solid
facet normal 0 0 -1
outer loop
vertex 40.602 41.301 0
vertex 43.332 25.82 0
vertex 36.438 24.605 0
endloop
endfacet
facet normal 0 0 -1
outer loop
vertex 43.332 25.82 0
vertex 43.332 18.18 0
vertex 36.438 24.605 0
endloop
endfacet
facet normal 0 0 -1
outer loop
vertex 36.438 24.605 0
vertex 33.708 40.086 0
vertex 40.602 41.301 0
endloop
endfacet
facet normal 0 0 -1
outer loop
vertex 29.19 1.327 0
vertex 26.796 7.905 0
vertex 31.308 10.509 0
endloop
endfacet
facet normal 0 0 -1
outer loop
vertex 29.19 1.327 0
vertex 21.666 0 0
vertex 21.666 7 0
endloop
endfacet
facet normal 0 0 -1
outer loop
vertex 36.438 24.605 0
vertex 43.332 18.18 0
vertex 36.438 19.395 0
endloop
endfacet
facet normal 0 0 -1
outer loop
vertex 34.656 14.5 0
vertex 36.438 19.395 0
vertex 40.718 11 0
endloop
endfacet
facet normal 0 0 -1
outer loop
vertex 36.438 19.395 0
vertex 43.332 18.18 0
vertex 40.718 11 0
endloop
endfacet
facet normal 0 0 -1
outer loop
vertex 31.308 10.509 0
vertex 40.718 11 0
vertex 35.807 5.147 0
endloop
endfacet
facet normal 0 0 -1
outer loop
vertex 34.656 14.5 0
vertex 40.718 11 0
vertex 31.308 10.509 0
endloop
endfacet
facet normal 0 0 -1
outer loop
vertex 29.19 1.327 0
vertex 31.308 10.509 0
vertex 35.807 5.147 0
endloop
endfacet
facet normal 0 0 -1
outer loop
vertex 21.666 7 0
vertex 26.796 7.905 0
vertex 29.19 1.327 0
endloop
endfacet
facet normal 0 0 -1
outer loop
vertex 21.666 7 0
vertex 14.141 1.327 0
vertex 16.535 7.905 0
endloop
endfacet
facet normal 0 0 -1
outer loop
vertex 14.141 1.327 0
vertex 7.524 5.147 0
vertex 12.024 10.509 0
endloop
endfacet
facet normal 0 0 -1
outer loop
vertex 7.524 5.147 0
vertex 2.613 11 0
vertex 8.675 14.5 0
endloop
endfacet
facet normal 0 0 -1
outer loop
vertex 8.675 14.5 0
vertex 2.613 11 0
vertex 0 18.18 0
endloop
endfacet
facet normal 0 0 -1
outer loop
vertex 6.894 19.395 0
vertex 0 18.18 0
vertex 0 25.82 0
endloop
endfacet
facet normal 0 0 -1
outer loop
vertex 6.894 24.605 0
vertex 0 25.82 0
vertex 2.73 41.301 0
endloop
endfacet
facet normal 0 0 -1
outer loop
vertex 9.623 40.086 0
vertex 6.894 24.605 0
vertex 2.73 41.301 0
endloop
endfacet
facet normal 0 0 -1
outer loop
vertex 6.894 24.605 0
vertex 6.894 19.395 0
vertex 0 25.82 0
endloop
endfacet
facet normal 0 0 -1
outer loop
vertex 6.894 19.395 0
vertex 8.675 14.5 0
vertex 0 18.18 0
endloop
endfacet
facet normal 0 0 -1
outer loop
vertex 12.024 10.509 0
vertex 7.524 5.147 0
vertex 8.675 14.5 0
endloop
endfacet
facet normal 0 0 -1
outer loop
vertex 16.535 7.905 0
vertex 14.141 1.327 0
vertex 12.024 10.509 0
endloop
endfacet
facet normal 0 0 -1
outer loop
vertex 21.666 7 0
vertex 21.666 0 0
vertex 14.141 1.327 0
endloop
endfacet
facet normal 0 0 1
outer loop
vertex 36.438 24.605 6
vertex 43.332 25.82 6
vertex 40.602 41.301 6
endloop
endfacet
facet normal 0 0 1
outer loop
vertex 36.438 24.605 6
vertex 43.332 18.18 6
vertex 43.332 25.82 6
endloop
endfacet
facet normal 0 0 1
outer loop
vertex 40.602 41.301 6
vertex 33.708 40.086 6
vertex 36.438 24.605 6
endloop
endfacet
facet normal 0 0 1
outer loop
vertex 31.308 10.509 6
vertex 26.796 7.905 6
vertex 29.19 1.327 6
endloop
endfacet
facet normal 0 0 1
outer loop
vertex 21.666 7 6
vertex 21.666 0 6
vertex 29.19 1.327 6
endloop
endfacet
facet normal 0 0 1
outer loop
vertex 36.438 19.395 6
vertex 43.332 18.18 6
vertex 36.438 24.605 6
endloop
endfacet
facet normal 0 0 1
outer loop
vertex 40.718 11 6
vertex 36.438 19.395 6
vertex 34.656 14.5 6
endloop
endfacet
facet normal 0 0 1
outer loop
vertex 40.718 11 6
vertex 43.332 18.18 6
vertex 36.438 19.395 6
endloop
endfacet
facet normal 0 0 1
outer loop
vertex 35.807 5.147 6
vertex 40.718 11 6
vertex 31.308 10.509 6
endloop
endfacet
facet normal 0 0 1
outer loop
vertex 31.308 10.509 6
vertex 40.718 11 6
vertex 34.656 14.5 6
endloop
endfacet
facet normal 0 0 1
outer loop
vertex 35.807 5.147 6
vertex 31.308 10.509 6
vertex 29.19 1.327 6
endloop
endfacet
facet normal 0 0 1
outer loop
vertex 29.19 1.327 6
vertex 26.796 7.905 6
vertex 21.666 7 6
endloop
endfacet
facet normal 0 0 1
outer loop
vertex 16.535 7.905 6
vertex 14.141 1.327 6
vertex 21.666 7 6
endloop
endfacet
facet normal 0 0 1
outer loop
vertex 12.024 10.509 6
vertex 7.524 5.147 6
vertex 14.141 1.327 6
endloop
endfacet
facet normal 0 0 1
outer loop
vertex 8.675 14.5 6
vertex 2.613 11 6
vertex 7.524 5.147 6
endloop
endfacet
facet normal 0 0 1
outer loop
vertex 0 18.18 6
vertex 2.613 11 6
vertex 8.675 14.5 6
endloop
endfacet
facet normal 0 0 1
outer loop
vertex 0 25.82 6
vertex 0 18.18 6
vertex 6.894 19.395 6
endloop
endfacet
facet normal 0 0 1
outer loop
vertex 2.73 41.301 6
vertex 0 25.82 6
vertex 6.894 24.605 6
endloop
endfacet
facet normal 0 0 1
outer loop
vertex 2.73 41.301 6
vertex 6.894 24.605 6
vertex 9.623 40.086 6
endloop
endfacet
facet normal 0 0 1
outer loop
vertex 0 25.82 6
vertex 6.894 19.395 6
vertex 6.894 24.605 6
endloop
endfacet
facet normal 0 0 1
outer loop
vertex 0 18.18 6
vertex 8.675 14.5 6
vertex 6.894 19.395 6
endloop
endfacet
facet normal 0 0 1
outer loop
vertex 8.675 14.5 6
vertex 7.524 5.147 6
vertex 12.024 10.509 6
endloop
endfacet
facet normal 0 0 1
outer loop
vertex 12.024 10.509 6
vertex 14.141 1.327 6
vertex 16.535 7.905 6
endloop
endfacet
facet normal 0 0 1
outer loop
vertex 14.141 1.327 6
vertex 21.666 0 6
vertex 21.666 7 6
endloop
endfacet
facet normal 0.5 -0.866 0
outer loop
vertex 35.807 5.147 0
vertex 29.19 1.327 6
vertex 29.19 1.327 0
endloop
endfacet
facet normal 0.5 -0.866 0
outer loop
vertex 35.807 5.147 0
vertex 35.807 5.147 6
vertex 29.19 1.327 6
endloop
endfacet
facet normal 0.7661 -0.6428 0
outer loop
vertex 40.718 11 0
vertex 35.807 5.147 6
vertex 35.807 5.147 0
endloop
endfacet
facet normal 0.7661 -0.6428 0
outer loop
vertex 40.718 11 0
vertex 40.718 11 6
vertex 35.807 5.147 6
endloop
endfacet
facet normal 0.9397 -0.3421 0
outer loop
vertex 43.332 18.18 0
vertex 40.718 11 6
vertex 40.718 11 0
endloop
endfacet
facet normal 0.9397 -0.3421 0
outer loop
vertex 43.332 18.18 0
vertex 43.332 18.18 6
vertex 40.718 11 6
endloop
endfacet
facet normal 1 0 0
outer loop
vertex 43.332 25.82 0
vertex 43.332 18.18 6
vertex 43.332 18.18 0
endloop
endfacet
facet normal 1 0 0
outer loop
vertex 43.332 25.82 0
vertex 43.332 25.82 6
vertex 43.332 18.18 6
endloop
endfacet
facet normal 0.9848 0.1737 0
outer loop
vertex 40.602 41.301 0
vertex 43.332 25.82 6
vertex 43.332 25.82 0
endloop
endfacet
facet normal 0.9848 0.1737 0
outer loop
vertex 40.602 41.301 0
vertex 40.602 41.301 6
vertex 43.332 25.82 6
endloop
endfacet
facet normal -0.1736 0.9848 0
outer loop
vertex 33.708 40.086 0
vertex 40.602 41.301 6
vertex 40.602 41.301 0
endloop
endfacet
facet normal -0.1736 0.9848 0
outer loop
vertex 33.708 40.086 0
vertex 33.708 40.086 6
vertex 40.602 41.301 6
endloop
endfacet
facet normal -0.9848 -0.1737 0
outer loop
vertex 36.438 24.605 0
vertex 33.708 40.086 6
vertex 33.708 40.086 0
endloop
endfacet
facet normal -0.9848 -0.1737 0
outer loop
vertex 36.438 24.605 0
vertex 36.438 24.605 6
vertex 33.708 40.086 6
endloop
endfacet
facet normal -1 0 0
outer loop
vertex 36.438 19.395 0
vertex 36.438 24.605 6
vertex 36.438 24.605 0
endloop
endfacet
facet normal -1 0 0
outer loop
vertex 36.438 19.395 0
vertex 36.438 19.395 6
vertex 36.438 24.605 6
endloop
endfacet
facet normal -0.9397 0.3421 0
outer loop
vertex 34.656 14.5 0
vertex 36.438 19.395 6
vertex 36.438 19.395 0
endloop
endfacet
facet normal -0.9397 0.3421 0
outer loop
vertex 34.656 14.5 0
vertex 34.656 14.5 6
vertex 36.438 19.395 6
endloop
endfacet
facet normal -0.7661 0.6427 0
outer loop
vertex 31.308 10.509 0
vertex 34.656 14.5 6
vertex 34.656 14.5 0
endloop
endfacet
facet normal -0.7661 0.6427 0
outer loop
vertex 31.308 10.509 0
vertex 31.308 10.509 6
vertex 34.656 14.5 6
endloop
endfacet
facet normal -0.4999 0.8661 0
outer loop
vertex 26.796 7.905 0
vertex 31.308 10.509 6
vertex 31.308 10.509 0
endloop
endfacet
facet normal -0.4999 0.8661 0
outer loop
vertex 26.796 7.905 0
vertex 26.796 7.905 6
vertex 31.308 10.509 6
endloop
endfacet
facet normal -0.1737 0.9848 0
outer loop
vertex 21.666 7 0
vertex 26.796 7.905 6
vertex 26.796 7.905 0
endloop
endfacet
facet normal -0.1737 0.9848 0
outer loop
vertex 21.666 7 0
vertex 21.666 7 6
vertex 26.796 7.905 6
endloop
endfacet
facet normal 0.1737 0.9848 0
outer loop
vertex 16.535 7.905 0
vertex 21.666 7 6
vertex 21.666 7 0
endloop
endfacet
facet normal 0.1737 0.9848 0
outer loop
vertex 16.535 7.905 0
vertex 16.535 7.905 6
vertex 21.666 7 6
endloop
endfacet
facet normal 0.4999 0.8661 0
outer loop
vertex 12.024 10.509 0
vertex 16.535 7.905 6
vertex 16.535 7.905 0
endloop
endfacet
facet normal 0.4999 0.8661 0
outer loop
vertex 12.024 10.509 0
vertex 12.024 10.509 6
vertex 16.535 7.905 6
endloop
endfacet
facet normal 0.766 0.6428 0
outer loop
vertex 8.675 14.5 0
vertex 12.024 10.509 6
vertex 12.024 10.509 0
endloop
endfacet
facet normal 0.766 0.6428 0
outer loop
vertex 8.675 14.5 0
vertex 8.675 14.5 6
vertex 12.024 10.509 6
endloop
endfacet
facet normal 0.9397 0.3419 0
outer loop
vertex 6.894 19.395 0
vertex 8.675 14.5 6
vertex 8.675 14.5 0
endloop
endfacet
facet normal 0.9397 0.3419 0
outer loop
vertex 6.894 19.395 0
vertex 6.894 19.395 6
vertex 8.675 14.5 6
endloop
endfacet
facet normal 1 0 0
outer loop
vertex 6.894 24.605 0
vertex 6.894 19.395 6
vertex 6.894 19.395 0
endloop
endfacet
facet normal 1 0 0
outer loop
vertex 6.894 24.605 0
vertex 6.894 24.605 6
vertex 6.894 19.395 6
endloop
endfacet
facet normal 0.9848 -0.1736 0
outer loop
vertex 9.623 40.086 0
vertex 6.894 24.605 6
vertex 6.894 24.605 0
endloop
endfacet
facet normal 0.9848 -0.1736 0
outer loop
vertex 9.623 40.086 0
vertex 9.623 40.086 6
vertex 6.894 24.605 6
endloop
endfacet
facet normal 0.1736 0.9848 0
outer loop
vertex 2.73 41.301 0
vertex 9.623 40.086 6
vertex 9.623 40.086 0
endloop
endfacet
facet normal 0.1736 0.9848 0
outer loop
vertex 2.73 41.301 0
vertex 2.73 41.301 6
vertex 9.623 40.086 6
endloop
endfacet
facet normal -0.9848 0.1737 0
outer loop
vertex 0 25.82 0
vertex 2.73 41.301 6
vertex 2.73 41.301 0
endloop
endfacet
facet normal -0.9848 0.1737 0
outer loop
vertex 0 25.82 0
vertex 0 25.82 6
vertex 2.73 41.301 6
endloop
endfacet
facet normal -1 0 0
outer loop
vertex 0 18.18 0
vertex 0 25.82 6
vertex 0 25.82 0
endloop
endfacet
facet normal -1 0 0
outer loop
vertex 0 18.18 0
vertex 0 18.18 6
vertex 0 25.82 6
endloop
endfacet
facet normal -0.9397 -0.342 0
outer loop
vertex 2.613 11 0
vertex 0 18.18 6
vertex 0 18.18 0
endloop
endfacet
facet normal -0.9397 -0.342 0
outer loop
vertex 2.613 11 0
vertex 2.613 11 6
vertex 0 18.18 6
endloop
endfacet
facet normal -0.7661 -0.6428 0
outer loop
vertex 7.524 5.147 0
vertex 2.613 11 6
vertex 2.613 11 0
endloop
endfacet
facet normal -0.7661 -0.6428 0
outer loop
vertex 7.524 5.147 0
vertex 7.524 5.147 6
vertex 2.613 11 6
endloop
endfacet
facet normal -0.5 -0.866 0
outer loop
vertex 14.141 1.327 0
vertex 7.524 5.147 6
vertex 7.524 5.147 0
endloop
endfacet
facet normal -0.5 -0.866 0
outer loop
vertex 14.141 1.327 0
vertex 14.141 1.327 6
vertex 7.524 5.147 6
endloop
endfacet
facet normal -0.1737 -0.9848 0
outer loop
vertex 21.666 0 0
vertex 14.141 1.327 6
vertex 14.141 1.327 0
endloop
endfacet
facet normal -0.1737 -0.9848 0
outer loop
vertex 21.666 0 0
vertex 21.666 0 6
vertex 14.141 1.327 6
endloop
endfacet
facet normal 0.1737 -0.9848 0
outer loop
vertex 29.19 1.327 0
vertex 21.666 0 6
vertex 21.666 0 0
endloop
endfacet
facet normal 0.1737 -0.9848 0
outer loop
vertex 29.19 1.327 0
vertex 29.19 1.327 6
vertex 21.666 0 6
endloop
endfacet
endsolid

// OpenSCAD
$fn = 32;

// ----------------------------------------------------------------------
// Clip blank: omega clip, 6 mm thick
// ----------------------------------------------------------------------

// --- parameters (mm) ---
profile_height = 6;       // extrusion height
profile_points = 26;      // points of the closed outline

profile = [[0, 25.82], [0, 18.18], [2.613, 11], [7.524, 5.147], [14.141, 1.327], [21.666, 0], [29.19, 1.327], [35.807, 5.147], [40.718, 11], [43.332, 18.18], [43.332, 25.82], [40.602, 41.301], [33.708, 40.086], [36.438, 24.605], [36.438, 19.395], [34.656, 14.5], [31.308, 10.509], [26.796, 7.905], [21.666, 7], [16.535, 7.905], [12.024, 10.509], [8.675, 14.5], [6.894, 19.395], [6.894, 24.605], [9.623, 40.086], [2.73, 41.301]];  // single closed polygon, 26 points, counter clockwise

// --- the one profile operation ---
linear_extrude(height = profile_height) polygon(points = profile);
